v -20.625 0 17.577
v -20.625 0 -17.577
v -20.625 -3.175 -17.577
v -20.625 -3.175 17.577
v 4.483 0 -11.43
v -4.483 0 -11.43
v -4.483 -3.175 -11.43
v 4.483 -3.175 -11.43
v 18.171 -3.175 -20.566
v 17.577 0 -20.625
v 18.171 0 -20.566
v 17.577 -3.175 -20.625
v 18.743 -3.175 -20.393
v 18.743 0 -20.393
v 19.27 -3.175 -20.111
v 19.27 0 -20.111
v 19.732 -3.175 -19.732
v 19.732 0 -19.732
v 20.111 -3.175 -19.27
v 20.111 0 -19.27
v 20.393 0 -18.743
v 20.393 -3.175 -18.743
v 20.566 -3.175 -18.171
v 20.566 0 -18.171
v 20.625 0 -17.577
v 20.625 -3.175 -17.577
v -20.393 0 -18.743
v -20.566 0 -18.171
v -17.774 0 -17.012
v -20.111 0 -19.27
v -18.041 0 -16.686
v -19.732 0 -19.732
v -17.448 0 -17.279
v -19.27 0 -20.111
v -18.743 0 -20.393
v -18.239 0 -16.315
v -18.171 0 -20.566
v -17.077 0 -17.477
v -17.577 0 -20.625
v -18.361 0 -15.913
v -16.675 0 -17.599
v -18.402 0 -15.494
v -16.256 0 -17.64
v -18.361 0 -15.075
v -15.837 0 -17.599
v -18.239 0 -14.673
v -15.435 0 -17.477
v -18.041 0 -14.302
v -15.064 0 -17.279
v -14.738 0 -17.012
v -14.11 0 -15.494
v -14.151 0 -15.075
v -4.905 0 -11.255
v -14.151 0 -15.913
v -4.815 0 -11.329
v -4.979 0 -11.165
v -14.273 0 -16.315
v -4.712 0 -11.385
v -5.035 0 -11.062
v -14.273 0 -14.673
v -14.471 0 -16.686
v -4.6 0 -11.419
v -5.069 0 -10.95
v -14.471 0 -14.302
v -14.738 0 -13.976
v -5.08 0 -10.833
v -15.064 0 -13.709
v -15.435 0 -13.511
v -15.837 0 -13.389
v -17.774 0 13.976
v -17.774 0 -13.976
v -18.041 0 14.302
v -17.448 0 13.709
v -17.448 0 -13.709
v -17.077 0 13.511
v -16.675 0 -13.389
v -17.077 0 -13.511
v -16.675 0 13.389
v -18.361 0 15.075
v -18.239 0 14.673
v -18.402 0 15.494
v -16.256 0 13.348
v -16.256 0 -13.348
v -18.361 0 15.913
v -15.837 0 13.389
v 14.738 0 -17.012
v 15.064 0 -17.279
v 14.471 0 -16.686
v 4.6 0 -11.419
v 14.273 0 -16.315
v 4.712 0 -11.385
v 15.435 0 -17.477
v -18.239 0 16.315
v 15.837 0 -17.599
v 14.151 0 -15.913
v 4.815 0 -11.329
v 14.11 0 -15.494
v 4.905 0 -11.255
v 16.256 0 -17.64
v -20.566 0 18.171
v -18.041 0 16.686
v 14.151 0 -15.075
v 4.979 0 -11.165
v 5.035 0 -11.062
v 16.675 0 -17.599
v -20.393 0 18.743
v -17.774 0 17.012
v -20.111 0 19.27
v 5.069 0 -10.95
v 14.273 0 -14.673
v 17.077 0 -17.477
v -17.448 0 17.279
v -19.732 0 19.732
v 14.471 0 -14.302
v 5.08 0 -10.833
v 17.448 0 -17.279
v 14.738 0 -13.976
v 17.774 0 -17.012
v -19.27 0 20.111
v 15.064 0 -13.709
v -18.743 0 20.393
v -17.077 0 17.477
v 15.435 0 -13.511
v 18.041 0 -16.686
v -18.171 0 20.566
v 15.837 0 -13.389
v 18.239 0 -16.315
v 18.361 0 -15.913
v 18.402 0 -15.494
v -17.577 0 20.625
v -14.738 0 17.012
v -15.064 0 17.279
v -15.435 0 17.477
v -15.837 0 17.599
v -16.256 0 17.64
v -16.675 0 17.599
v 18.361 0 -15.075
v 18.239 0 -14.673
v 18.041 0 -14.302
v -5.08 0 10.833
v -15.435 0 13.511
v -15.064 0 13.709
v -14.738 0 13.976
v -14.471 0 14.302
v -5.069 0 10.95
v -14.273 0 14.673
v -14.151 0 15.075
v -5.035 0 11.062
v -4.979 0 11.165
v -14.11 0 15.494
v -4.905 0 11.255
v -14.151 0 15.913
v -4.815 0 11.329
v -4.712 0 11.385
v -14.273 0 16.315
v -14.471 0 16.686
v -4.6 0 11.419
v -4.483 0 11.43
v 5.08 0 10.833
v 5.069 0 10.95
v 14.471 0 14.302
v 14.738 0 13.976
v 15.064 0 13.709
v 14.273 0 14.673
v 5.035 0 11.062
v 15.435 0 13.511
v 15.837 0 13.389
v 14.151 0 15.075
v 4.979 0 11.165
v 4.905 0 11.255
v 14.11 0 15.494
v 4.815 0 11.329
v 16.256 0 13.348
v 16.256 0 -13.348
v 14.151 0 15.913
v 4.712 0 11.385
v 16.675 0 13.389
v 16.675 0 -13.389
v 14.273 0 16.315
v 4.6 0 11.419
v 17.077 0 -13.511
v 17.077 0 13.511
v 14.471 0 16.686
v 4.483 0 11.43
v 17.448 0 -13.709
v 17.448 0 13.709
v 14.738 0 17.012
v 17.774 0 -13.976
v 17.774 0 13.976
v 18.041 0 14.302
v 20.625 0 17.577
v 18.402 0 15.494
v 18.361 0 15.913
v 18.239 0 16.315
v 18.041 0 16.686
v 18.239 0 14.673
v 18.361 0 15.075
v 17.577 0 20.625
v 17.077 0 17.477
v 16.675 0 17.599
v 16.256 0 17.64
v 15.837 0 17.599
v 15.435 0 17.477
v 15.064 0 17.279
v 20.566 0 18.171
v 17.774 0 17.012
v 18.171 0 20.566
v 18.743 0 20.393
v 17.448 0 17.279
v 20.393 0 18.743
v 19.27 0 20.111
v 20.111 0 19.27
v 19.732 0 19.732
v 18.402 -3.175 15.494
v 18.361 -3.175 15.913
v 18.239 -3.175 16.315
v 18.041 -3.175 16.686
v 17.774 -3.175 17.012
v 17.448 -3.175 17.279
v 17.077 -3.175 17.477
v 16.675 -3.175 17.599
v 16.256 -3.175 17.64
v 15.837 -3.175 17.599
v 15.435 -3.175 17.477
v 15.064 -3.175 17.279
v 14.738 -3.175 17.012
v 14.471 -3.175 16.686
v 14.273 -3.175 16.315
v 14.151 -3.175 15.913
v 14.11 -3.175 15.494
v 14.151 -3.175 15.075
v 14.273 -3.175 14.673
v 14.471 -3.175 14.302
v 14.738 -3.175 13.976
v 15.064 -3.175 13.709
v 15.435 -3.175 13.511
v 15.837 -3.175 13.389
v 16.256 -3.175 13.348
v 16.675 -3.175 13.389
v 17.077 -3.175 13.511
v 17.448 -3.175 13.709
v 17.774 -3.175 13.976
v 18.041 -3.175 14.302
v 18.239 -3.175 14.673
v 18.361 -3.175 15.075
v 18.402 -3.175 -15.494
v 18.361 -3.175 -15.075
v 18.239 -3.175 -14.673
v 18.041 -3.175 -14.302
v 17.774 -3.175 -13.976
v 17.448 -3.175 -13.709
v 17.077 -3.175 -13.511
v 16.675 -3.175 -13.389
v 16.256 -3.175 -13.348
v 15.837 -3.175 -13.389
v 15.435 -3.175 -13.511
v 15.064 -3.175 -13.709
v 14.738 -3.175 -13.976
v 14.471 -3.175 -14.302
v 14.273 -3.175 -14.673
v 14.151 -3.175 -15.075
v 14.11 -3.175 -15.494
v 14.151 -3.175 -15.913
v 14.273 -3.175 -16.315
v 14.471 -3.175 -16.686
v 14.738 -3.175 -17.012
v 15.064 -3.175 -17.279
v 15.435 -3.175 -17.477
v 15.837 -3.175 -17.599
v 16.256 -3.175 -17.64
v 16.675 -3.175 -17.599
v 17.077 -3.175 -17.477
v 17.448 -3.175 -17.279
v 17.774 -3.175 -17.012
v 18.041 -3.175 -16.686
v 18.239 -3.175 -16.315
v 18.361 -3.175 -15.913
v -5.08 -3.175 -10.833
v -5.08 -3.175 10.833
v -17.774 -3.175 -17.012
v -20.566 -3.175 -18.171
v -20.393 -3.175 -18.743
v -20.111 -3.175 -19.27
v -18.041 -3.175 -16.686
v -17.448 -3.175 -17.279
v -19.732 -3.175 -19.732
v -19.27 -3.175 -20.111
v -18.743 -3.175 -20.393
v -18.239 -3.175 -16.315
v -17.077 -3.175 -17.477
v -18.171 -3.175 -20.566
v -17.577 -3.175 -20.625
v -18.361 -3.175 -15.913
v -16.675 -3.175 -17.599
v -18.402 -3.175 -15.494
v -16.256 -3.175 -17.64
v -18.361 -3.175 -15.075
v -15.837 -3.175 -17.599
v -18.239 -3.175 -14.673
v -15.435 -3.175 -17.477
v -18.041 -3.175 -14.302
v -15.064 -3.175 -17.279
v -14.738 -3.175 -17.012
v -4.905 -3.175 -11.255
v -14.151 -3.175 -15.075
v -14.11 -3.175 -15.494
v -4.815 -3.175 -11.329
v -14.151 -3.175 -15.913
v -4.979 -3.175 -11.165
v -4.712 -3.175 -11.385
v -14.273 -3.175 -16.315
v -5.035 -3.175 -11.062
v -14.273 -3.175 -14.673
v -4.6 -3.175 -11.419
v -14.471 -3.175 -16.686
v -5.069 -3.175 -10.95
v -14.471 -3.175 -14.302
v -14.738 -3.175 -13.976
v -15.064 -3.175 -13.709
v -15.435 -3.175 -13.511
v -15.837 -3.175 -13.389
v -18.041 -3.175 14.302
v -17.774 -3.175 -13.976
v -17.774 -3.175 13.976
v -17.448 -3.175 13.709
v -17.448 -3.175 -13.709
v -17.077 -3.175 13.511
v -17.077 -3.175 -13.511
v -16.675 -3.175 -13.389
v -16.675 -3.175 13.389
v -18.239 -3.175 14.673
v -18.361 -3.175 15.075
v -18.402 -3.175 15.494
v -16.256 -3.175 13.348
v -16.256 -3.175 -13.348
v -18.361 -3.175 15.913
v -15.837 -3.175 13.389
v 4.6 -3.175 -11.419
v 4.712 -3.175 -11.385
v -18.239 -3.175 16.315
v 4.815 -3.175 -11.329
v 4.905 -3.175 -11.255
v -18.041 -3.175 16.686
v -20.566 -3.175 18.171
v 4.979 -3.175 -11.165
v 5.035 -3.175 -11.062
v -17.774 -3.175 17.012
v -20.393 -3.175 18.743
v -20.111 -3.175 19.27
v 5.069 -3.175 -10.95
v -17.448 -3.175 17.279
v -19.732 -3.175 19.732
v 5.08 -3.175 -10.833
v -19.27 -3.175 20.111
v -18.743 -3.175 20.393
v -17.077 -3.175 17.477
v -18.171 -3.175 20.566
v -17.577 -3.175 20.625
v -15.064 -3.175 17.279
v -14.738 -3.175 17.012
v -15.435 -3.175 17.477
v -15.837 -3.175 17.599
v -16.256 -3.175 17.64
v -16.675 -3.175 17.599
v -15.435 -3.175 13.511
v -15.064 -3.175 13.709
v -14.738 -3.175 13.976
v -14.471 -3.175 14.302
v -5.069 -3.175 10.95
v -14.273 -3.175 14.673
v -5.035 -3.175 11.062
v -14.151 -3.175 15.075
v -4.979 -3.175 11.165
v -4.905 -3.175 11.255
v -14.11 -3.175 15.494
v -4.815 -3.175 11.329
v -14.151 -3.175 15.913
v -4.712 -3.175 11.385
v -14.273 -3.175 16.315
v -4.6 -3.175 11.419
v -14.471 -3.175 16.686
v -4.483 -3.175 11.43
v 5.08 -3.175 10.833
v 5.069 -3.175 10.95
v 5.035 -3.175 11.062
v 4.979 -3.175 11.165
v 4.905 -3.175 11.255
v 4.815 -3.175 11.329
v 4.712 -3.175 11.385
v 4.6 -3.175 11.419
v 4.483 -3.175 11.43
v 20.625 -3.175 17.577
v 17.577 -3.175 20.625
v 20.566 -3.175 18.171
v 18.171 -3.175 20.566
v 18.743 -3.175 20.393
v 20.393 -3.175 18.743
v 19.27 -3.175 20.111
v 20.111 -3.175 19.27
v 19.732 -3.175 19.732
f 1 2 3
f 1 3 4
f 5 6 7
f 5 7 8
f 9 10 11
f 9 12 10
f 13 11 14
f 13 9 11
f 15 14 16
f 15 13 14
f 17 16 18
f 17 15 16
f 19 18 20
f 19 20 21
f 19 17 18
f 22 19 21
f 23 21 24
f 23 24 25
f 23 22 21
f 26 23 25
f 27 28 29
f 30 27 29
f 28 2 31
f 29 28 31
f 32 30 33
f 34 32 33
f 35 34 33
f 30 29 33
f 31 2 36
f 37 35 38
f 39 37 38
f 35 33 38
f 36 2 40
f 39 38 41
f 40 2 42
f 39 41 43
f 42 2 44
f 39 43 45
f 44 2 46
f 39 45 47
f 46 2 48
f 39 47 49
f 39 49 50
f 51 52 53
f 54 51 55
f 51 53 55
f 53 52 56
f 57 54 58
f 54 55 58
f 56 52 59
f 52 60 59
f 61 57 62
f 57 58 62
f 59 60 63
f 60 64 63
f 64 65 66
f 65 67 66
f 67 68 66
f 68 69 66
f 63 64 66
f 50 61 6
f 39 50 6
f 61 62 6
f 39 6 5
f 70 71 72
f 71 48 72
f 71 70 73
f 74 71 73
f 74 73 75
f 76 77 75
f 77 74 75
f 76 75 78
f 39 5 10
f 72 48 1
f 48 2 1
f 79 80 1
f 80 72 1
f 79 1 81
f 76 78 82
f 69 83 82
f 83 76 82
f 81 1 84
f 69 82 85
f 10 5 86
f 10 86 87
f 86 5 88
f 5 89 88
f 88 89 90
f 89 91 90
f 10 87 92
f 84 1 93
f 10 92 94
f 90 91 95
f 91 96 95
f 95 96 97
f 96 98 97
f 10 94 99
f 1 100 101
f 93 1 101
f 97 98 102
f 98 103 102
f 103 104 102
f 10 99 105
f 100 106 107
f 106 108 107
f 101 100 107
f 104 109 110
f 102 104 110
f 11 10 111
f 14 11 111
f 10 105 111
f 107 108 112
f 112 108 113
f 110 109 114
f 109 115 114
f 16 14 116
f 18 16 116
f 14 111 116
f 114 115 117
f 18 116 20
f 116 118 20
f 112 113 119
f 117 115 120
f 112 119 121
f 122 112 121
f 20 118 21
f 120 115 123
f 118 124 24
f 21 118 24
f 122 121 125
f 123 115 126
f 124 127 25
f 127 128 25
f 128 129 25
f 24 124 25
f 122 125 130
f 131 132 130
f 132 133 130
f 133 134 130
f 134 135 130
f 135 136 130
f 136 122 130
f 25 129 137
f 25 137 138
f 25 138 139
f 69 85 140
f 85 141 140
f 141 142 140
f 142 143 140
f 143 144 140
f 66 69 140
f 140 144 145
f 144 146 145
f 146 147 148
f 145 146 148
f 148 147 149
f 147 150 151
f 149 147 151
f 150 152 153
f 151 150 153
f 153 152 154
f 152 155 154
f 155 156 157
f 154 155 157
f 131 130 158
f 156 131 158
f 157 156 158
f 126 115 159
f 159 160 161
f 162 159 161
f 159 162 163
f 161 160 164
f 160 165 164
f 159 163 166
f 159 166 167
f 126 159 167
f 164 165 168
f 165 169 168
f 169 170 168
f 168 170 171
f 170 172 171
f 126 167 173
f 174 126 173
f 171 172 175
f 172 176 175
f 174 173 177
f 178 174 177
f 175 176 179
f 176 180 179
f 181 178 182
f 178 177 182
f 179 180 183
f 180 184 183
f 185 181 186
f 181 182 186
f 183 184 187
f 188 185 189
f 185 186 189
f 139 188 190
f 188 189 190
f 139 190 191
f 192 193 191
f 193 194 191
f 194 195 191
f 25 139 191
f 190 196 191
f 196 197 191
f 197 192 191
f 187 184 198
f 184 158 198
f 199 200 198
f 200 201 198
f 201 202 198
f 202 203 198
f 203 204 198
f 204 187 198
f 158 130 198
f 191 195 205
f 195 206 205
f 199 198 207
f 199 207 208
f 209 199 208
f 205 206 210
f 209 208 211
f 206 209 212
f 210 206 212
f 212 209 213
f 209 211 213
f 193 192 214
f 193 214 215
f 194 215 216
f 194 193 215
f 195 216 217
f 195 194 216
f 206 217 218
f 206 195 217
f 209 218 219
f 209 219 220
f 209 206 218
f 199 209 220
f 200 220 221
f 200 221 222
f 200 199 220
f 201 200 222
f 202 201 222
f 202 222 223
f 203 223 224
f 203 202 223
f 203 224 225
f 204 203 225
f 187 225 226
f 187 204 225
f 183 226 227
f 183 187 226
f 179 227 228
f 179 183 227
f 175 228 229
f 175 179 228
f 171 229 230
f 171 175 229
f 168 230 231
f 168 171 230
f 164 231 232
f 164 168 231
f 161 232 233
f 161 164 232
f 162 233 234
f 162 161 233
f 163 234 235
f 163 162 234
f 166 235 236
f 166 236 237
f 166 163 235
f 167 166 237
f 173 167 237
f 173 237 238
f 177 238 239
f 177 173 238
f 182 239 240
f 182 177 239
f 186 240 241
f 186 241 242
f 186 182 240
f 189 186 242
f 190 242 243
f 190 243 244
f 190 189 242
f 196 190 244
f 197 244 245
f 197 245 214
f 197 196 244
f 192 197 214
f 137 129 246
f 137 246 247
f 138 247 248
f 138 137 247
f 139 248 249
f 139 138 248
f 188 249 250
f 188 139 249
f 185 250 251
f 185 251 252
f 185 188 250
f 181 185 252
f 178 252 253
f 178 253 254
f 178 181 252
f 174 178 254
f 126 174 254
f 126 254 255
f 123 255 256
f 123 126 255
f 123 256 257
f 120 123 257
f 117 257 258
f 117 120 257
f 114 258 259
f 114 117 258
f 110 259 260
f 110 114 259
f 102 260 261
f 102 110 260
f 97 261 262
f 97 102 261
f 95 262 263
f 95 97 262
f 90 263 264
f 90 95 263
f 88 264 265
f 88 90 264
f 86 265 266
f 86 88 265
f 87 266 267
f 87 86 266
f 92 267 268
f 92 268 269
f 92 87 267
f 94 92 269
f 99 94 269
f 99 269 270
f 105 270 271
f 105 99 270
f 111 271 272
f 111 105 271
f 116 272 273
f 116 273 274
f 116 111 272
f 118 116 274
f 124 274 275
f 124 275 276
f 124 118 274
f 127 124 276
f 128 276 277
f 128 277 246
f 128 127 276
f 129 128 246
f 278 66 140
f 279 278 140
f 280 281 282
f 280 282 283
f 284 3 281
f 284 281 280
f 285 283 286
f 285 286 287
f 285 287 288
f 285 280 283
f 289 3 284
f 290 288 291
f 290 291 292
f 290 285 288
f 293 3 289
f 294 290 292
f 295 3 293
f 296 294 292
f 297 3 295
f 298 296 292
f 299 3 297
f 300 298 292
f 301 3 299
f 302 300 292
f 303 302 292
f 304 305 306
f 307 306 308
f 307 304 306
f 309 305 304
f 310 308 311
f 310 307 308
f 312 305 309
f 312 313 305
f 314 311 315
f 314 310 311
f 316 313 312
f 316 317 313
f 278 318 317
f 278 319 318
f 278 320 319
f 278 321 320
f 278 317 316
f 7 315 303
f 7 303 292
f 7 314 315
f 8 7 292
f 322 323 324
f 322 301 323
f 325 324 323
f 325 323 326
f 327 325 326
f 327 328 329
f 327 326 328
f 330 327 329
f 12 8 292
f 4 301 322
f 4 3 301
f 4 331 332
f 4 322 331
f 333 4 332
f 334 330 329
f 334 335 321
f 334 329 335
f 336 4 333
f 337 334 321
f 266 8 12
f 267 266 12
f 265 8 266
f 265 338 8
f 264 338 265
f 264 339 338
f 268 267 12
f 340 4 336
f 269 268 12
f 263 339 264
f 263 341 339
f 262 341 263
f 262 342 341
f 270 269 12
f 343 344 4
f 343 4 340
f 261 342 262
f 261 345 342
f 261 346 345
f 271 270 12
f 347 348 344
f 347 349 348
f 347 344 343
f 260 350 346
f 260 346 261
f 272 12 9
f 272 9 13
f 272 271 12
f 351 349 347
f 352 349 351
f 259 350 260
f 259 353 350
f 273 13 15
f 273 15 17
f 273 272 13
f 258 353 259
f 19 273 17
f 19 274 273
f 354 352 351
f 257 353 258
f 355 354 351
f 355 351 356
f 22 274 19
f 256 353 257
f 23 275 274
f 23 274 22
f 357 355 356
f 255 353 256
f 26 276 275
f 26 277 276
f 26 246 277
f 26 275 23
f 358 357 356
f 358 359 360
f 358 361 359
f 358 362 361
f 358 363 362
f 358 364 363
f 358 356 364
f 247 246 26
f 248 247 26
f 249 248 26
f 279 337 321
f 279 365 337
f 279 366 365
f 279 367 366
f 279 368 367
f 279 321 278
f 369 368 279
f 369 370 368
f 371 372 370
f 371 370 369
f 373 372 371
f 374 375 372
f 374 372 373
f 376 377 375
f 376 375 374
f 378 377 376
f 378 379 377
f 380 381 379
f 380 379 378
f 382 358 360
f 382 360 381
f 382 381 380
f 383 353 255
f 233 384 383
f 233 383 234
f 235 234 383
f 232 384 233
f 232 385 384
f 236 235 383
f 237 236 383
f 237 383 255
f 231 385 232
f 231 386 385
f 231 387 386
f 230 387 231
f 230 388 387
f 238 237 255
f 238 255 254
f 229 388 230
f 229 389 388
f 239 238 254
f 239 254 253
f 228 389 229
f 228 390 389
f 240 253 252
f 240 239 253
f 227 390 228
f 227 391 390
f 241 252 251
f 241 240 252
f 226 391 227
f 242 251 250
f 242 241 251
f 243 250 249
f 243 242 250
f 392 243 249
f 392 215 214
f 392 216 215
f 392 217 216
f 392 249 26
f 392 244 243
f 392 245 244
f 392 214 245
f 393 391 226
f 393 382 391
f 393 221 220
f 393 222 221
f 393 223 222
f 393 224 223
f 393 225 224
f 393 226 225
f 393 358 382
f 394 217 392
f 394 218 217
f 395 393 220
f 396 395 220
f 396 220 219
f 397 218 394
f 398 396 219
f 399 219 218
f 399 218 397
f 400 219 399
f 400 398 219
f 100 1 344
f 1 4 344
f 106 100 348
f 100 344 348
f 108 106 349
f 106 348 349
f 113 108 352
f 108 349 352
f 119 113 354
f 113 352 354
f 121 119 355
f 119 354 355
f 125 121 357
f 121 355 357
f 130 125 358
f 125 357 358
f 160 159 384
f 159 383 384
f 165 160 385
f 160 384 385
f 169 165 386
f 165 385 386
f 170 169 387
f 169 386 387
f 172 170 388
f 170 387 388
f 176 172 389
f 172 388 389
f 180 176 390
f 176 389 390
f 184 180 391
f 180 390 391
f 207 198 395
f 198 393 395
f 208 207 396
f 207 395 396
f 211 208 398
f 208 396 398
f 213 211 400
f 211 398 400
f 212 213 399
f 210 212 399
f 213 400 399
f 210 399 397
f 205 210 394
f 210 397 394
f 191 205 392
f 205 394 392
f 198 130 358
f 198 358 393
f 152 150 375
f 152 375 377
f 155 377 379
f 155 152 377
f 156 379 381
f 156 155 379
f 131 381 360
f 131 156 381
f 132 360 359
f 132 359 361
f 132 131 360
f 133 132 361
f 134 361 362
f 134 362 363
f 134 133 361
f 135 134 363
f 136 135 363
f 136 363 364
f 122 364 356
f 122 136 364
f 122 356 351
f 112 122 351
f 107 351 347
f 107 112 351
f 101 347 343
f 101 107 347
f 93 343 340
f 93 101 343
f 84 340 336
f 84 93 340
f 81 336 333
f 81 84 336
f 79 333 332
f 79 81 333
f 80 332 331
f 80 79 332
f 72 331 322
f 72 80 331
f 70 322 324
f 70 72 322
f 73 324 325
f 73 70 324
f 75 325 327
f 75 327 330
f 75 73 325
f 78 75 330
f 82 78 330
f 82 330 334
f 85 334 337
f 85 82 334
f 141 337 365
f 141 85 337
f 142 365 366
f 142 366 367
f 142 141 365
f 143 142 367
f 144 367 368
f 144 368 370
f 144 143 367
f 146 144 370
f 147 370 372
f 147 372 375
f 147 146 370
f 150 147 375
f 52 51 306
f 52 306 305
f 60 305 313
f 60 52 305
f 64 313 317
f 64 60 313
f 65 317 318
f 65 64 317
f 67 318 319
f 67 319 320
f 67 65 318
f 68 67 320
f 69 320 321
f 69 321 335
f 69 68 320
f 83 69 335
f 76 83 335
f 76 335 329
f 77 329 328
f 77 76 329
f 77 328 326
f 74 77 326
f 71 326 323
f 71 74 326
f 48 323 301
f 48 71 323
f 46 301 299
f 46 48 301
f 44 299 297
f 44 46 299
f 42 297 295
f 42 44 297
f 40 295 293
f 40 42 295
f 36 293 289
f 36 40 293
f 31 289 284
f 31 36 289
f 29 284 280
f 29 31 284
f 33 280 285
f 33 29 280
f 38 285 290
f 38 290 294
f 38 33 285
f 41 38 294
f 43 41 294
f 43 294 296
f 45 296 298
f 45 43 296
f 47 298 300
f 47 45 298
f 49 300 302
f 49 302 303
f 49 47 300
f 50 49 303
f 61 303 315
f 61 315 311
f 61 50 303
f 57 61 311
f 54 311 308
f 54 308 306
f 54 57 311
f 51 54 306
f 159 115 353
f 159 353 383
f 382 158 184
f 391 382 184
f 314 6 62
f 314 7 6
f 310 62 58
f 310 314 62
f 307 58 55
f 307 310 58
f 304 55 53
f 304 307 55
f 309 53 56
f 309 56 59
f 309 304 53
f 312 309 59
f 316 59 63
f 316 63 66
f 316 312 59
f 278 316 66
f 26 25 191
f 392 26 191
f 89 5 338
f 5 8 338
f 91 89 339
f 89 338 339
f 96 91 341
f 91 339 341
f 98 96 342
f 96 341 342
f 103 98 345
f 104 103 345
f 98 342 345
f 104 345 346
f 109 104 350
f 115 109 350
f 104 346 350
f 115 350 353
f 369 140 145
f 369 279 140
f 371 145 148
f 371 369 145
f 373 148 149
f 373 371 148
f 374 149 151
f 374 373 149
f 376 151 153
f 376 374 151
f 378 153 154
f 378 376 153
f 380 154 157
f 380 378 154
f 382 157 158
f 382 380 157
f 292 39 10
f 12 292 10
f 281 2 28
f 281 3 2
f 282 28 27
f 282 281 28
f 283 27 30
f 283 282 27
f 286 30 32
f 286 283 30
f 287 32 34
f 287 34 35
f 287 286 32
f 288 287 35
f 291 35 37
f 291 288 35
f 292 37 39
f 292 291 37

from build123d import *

# Parameters (mm, degrees)
F0_W     = 41.2496
F0_H     = 41.2496
F0_R     = 2.1463
F0_W_2   = 10.16
F0_H_2   = 22.86
F1_DEPTH = 3.175
F2_R     = 3.048
F3_R     = 0.5969


with BuildPart() as f1:
    # F0 (on Front) → F1 (new body)
    with BuildSketch(Plane.XZ):
        Rectangle(F0_W, F0_H)
        with Locations((-16.256, -15.494)):
            Circle(F0_R, mode=Mode.SUBTRACT)
        with Locations((16.256, -15.494)):
            Circle(F0_R, mode=Mode.SUBTRACT)
        with Locations((-16.256, 15.494)):
            Circle(F0_R, mode=Mode.SUBTRACT)
        Rectangle(F0_W_2, F0_H_2, mode=Mode.SUBTRACT)
        with Locations((16.256, 15.494)):
            Circle(F0_R, mode=Mode.SUBTRACT)
    extrude(amount=F1_DEPTH)

    # F2
    f2_edges = [f1.edges().sort_by_distance(p)[0] for p in [
        (20.6248, -1.5875, 20.6248),
        (-20.6248, -1.5875, 20.6248),
        (-20.6248, -1.5875, -20.6248),
        (20.6248, -1.5875, -20.6248),
    ]]
    fillet(f2_edges, radius=F2_R)

    # F3
    f3_edges = [f1.edges().sort_by_distance(p)[0] for p in [
        (-5.08, -1.5875, 11.43),
        (5.08, -1.5875, 11.43),
        (-5.08, -1.5875, -11.43),
        (5.08, -1.5875, -11.43),
    ]]
    fillet(f3_edges, radius=F3_R)


solid = f1.part
